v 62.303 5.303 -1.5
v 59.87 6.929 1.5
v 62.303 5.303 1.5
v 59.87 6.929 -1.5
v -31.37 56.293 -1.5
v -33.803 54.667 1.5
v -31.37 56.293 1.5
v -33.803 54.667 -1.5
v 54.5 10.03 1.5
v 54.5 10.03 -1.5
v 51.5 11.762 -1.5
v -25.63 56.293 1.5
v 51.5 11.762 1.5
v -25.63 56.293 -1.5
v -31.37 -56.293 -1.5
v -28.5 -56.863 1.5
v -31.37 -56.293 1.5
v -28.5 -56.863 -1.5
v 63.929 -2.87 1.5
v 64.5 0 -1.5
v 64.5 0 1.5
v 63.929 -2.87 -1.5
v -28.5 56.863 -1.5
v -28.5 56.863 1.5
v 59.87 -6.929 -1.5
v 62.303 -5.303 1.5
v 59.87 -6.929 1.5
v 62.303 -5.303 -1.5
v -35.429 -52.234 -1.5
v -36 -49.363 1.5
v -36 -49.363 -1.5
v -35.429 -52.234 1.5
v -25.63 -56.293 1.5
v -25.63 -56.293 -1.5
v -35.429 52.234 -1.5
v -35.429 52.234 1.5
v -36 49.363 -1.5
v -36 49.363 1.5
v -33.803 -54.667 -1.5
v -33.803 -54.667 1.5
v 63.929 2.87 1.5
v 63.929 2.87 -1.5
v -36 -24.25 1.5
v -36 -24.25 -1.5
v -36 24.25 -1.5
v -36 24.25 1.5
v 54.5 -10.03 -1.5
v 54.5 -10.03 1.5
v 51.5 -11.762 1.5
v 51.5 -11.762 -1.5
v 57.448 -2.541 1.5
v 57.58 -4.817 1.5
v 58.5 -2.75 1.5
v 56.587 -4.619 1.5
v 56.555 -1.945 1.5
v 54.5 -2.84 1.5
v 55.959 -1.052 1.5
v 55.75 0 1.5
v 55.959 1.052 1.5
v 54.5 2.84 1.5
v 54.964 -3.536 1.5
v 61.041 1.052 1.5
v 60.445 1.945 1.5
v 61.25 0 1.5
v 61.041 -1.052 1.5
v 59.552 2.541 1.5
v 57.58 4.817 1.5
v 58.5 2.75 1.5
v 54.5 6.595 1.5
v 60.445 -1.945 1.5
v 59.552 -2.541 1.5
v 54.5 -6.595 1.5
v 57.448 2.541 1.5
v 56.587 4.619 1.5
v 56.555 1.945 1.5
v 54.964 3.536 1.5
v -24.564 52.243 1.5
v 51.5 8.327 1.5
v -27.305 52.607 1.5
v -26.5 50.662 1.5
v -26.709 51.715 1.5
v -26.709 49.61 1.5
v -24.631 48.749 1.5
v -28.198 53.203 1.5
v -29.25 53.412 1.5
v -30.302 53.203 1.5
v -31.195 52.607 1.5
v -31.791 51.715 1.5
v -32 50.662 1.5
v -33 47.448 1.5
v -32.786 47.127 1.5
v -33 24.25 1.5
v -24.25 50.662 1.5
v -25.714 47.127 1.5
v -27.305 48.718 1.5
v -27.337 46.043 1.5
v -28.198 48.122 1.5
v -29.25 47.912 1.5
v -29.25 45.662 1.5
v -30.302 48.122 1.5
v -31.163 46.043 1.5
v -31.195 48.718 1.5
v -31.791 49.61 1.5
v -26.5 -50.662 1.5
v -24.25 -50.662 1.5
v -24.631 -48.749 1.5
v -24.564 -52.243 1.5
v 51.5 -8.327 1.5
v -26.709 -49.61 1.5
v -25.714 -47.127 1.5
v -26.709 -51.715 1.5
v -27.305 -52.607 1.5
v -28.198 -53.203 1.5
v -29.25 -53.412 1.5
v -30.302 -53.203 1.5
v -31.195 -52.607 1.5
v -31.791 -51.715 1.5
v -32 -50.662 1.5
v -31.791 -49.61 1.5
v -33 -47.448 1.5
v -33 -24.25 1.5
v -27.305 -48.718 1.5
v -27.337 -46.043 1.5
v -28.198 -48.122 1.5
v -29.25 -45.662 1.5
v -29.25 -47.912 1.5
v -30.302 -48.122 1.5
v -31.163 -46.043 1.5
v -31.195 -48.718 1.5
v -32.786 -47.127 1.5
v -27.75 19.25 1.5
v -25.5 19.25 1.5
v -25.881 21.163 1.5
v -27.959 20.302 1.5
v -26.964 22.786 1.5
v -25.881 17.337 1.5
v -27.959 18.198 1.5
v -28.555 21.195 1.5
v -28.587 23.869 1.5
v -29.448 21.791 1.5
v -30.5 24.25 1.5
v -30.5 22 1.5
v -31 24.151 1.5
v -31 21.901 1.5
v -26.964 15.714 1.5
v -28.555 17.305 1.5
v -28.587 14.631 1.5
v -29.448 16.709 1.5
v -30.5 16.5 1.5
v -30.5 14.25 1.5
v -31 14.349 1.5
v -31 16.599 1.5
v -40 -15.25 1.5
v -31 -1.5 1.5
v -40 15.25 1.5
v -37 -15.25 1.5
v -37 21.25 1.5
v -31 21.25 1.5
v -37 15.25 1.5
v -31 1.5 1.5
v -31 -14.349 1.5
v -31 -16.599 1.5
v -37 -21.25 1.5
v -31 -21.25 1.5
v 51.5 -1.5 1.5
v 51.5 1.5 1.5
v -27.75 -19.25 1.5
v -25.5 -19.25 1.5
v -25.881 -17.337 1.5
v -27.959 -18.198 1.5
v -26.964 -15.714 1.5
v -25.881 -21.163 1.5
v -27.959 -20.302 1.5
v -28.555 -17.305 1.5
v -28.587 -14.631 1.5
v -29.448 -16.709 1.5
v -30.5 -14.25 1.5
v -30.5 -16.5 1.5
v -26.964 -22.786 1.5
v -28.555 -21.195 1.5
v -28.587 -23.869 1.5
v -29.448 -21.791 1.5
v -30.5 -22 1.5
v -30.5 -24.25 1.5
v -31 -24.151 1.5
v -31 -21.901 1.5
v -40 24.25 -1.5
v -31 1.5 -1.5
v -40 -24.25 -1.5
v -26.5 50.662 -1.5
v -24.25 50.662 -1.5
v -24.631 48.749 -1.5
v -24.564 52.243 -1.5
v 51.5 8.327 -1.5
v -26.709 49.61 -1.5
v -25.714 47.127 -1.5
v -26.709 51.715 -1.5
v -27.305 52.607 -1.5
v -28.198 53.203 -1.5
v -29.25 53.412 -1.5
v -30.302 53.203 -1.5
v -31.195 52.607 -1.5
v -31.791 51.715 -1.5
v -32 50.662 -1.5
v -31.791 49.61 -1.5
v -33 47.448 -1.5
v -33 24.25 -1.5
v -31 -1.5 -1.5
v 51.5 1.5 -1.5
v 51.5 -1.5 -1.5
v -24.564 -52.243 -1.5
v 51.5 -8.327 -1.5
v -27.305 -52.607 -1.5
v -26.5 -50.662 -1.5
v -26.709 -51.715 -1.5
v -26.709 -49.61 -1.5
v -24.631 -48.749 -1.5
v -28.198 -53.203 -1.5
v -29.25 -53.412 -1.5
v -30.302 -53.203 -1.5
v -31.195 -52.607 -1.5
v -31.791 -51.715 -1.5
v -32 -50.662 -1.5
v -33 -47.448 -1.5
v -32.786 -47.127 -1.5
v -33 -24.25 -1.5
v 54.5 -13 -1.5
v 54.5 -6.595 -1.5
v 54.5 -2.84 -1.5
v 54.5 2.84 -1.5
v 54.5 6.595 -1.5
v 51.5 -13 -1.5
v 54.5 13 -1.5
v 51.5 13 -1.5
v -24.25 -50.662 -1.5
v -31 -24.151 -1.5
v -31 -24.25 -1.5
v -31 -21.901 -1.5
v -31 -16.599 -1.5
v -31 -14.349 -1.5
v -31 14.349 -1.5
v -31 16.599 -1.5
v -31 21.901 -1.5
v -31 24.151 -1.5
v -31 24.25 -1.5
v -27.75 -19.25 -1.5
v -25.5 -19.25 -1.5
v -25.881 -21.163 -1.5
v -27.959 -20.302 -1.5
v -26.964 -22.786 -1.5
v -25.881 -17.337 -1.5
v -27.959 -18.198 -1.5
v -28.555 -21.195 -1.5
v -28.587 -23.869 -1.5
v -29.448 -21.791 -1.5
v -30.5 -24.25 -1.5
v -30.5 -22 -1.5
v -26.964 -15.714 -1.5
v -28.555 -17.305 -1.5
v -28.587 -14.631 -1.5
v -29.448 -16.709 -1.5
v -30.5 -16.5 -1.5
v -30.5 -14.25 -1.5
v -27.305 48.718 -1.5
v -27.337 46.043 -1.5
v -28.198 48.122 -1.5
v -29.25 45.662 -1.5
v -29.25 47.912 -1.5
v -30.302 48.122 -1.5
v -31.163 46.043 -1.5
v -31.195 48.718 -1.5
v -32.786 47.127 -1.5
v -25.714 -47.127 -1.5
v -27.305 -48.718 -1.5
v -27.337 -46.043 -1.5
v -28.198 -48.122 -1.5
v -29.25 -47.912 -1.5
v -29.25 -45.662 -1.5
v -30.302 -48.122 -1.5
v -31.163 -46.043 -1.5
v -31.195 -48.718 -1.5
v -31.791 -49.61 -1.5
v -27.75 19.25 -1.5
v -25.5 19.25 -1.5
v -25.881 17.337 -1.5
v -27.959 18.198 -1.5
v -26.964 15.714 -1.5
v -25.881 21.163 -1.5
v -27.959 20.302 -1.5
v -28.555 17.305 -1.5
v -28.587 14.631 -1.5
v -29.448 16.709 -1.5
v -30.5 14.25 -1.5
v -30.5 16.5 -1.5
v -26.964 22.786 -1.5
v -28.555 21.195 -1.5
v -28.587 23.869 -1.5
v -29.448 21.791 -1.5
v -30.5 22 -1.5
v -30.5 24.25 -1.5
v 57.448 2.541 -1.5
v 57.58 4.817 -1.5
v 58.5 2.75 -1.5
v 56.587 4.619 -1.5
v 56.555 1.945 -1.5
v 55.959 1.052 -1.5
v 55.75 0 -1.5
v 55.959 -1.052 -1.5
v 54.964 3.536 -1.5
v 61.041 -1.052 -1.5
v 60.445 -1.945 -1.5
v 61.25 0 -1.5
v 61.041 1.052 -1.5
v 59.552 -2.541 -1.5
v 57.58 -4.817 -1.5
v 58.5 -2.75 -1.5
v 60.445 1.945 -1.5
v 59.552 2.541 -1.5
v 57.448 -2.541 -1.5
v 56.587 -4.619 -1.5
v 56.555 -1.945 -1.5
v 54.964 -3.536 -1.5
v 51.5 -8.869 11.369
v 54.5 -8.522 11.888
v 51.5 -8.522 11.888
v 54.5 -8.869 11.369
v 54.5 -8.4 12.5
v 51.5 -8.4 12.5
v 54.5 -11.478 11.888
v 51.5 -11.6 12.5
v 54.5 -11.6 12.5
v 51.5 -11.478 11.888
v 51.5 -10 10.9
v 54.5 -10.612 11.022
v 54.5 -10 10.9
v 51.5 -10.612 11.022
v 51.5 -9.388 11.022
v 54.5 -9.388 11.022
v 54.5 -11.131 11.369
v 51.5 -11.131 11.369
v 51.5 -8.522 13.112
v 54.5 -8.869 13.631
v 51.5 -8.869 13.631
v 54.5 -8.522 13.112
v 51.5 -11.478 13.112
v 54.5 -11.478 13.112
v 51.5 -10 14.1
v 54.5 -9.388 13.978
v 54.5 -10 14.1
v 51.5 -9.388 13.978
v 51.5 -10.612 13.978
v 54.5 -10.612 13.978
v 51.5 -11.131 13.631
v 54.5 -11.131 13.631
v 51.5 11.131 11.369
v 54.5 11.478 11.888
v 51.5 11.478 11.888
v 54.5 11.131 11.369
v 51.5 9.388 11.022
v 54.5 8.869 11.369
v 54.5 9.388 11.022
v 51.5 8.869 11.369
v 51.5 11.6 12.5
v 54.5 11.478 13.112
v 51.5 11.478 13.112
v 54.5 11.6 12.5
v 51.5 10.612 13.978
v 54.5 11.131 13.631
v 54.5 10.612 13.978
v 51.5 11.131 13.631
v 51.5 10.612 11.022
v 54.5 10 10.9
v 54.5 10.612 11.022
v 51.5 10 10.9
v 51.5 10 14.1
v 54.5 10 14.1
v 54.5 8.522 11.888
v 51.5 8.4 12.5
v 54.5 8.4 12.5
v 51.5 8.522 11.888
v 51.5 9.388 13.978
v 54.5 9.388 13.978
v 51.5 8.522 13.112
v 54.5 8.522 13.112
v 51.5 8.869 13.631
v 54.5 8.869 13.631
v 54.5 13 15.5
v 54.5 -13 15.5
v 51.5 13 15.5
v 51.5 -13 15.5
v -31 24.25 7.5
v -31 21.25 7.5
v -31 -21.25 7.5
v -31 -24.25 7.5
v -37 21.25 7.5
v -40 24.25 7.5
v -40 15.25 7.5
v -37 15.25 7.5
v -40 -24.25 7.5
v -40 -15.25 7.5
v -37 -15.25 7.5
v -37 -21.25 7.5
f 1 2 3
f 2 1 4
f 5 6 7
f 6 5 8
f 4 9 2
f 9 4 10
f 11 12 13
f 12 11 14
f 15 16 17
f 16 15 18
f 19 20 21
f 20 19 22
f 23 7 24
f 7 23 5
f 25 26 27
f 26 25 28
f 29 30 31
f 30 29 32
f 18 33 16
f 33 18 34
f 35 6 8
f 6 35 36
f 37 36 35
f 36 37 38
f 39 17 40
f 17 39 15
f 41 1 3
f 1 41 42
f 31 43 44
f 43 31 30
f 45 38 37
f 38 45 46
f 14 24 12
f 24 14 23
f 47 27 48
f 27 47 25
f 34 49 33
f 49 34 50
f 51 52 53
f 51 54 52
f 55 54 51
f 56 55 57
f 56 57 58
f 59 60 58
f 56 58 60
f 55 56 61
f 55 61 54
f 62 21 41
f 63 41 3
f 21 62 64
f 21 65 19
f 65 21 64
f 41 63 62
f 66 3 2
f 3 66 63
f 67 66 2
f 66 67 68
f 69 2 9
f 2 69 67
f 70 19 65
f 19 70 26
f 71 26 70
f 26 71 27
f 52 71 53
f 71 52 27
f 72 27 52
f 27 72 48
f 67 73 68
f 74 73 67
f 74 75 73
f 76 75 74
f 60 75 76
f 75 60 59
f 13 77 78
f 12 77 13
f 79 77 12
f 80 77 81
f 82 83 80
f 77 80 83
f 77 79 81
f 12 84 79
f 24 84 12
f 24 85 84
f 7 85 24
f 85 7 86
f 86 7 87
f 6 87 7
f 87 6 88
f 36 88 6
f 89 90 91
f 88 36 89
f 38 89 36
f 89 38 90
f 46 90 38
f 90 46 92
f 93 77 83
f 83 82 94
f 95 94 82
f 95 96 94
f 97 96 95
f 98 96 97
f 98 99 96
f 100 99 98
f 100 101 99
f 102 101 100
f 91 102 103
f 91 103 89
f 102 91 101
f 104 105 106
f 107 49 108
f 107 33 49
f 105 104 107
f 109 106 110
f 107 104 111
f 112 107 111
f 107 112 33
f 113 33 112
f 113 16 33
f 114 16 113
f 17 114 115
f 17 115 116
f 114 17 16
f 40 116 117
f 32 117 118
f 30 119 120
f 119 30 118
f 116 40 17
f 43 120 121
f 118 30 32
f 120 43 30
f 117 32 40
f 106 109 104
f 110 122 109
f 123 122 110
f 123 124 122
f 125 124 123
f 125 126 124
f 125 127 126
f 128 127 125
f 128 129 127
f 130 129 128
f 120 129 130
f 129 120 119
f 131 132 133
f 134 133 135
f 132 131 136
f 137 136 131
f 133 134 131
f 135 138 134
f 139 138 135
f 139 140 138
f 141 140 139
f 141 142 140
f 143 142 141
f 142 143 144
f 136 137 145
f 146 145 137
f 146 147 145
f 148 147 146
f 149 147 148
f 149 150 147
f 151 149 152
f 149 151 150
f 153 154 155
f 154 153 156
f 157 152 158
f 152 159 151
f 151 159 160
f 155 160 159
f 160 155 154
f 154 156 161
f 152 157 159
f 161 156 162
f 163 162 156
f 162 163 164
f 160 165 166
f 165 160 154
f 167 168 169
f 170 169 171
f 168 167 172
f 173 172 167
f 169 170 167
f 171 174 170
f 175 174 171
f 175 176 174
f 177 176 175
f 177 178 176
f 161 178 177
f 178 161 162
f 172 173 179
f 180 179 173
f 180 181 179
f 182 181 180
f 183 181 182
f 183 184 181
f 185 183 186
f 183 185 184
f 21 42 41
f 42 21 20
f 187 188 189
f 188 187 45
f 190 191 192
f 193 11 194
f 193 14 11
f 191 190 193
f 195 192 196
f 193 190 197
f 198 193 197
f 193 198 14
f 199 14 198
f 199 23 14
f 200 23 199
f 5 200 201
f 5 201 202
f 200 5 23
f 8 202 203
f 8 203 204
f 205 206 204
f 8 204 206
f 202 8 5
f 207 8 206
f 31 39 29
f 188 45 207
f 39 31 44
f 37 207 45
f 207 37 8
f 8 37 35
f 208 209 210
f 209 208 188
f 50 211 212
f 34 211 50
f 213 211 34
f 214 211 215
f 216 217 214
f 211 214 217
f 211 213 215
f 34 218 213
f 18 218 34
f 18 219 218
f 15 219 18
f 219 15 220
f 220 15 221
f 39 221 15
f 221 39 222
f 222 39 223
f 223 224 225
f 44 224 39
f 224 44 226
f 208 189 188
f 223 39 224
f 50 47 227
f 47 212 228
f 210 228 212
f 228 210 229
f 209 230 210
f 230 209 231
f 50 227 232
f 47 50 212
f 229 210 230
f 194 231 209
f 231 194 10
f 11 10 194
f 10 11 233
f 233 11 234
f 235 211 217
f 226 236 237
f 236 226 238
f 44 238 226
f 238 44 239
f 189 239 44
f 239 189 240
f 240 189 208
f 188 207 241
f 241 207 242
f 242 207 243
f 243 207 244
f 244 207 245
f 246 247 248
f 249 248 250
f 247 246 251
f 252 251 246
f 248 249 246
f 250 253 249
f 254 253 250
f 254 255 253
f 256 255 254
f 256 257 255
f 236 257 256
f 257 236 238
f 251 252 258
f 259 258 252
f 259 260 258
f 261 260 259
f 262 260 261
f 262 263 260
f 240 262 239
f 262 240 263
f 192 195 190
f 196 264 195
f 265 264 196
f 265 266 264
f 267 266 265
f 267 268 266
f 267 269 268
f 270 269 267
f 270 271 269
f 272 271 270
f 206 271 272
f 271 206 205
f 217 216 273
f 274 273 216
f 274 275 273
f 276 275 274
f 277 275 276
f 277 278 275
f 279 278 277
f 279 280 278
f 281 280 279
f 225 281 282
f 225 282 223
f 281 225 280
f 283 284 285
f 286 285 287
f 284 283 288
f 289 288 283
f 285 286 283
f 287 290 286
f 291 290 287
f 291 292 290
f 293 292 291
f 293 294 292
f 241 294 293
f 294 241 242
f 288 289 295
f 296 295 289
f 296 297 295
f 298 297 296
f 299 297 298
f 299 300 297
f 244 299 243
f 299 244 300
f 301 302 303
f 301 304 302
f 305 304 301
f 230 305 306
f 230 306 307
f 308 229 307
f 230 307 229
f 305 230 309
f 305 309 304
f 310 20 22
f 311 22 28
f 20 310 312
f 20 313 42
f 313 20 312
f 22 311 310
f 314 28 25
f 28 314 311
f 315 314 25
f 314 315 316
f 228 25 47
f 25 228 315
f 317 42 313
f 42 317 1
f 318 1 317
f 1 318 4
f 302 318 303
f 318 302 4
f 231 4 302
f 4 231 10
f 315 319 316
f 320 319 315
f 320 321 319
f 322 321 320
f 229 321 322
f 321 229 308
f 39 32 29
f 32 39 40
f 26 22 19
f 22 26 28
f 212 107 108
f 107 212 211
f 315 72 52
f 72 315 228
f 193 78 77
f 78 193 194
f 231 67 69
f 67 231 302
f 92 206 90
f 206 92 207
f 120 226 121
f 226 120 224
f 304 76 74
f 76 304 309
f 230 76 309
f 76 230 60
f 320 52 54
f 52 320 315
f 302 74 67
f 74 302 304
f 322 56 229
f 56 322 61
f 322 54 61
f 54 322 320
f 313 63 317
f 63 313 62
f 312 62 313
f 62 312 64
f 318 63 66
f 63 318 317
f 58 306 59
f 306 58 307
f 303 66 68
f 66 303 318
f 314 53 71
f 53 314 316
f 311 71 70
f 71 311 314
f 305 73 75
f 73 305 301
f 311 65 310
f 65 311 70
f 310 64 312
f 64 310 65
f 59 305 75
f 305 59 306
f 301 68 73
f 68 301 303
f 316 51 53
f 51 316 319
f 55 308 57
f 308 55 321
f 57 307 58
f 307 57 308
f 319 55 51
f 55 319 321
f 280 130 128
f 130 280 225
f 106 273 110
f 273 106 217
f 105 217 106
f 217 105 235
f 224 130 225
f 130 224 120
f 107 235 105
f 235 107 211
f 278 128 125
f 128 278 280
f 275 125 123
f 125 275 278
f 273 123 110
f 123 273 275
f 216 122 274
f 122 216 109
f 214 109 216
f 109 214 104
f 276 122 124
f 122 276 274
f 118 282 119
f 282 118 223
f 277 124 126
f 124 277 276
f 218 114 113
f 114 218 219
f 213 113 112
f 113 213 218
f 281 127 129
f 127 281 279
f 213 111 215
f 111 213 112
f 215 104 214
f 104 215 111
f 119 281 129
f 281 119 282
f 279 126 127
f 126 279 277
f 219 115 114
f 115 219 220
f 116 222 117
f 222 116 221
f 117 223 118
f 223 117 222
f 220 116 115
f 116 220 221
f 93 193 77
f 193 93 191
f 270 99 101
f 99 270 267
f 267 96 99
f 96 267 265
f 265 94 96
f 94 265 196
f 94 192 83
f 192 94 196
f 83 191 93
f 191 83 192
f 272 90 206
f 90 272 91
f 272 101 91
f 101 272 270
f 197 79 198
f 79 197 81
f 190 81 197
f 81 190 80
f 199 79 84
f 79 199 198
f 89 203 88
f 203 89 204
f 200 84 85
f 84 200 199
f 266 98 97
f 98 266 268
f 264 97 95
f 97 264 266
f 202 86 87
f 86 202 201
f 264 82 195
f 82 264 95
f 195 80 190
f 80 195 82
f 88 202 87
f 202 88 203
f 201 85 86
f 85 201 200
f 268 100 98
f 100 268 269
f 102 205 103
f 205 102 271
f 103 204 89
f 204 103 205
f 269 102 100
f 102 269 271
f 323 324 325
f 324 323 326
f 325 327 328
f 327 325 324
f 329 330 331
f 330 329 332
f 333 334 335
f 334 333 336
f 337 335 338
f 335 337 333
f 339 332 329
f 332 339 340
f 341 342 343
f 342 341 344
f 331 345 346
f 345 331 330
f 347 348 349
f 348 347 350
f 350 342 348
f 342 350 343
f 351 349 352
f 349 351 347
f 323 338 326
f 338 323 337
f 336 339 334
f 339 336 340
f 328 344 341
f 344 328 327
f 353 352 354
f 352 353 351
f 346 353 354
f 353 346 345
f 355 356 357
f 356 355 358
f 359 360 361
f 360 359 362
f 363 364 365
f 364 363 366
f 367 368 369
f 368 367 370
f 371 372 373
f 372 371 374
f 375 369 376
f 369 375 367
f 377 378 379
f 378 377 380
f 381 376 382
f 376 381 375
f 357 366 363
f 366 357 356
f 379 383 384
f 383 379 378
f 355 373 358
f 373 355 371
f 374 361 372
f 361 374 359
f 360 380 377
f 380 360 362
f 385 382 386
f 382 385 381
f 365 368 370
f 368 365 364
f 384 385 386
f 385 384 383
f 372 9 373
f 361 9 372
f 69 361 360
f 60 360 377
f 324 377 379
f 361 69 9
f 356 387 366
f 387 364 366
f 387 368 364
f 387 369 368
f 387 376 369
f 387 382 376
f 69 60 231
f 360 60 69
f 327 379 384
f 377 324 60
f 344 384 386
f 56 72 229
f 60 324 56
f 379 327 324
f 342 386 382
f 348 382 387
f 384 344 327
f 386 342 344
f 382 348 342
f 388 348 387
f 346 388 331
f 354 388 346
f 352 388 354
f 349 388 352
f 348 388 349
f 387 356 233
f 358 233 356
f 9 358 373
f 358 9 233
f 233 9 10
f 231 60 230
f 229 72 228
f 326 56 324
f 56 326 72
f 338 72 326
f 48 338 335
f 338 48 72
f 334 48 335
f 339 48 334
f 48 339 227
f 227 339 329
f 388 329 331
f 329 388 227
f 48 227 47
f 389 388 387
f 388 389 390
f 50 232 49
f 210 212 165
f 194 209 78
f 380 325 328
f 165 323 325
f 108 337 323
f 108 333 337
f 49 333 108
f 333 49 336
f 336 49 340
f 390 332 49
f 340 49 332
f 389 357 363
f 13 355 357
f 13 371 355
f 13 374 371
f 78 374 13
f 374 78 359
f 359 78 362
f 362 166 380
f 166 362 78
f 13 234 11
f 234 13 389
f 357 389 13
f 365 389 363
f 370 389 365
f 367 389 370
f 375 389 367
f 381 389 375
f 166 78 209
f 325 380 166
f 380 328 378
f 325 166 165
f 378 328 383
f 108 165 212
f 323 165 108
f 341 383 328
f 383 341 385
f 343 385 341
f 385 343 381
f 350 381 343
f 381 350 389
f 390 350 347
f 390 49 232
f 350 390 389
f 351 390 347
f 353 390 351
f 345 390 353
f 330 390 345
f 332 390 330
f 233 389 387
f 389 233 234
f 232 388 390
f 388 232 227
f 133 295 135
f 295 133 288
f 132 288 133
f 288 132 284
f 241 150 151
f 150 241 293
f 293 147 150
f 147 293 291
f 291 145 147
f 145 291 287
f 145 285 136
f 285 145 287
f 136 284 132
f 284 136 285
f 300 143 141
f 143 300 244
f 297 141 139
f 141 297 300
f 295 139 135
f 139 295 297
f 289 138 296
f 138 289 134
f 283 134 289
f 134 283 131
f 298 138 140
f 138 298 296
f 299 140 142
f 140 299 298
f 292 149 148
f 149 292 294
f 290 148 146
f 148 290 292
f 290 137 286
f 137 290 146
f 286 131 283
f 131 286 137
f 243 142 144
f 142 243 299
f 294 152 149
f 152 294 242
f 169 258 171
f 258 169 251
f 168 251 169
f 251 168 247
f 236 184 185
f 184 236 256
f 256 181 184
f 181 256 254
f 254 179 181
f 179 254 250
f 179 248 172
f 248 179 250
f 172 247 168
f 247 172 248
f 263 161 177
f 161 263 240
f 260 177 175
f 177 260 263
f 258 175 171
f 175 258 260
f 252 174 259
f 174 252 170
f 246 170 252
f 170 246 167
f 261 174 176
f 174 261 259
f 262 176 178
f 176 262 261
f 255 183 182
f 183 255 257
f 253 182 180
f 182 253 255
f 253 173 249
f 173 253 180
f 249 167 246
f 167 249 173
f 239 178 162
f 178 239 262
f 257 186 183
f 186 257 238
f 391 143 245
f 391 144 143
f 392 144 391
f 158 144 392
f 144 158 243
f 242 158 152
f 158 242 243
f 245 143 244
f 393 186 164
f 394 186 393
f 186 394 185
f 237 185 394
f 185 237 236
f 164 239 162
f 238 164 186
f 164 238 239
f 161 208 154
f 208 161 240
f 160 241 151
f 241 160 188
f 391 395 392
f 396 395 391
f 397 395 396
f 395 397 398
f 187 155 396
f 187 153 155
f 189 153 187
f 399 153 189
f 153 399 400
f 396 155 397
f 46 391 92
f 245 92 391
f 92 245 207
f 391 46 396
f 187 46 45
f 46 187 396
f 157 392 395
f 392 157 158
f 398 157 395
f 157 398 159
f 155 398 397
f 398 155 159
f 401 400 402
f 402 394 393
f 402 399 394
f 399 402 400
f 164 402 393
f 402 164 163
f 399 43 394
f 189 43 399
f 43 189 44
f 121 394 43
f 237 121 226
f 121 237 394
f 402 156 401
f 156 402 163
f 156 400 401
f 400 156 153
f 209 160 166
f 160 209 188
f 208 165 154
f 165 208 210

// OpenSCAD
$fn = 16;

d = 114;
length = 84;
rounding = 15;
thickness = 3;
eyelet_dia = 10;

front_mount_height = 11;
front_mount_width = 20;
nema_width = 42.5;

screw_dia = 3;

module rounded_extruded_triagle(d1 = 110, d2 = 15, h = 3) {
	minkowski() {
		cylinder(d = d2, h = h/2, center = true);
		cylinder(d = d1, h = h/2, $fn = 3, center = true);
	}
}

module eyelet(d = 10, h = 3) {
	difference() {
		cylinder(d = d, h = h, center = true);
		cylinder(d = d - 1.5*h, h = h+1, center = true);
	}
}

difference() {
	rounded_extruded_triagle(d1 = d, d2 = rounding,
		h = thickness);
	rounded_extruded_triagle(d1 = d, d2 = rounding - 2*thickness,
		h = thickness+1);
}

for (a = [0:120:360])
	translate([(d/2+thickness/2)*sin(90+a), (d/2+thickness/2)*cos(90+a), 0]) eyelet();

translate([-length/2-thickness-eyelet_dia/2+1+(d/2+thickness/2)*sin(90), 0, 0]) {
	cube([length + 2*thickness, thickness, thickness], center = true);

	// front mount plate
	front_mount_plate_width = front_mount_width + 2*screw_dia;
	front_mount_plate_height = front_mount_height + screw_dia + thickness;
	translate([length/2 + thickness/2, 0, front_mount_plate_height/2 - thickness/2]) {
		difference() {
			cube([thickness, front_mount_plate_width, front_mount_plate_height], center = true);
			for (a = [-1:2:1])
				translate([0, a*front_mount_width/2, front_mount_height/2 + thickness/2 - screw_dia/2])
					rotate([0, 90, 0])
						cylinder(d = screw_dia + 0.2, h = thickness + 1, center = true);
		}
	}

	// rear fixings
	translate([-length/2 - thickness, 0, 0]) {
		union() {
			cube([3*thickness, nema_width, thickness], center = true);
			for (a = [-1:2:1]) {
				translate([0, a*(-nema_width/2 - thickness/2), thickness])
					cube([3*thickness, thickness, 3*thickness], center = true);
				translate([-thickness, a*(-nema_width/2 + thickness), thickness])
					cube([thickness, 2*thickness, 3*thickness], center = true);
				translate([eyelet_dia/2, a*(-nema_width/2 - thickness + eyelet_dia/2), 0])
					eyelet();
			}
		}
	}
}
